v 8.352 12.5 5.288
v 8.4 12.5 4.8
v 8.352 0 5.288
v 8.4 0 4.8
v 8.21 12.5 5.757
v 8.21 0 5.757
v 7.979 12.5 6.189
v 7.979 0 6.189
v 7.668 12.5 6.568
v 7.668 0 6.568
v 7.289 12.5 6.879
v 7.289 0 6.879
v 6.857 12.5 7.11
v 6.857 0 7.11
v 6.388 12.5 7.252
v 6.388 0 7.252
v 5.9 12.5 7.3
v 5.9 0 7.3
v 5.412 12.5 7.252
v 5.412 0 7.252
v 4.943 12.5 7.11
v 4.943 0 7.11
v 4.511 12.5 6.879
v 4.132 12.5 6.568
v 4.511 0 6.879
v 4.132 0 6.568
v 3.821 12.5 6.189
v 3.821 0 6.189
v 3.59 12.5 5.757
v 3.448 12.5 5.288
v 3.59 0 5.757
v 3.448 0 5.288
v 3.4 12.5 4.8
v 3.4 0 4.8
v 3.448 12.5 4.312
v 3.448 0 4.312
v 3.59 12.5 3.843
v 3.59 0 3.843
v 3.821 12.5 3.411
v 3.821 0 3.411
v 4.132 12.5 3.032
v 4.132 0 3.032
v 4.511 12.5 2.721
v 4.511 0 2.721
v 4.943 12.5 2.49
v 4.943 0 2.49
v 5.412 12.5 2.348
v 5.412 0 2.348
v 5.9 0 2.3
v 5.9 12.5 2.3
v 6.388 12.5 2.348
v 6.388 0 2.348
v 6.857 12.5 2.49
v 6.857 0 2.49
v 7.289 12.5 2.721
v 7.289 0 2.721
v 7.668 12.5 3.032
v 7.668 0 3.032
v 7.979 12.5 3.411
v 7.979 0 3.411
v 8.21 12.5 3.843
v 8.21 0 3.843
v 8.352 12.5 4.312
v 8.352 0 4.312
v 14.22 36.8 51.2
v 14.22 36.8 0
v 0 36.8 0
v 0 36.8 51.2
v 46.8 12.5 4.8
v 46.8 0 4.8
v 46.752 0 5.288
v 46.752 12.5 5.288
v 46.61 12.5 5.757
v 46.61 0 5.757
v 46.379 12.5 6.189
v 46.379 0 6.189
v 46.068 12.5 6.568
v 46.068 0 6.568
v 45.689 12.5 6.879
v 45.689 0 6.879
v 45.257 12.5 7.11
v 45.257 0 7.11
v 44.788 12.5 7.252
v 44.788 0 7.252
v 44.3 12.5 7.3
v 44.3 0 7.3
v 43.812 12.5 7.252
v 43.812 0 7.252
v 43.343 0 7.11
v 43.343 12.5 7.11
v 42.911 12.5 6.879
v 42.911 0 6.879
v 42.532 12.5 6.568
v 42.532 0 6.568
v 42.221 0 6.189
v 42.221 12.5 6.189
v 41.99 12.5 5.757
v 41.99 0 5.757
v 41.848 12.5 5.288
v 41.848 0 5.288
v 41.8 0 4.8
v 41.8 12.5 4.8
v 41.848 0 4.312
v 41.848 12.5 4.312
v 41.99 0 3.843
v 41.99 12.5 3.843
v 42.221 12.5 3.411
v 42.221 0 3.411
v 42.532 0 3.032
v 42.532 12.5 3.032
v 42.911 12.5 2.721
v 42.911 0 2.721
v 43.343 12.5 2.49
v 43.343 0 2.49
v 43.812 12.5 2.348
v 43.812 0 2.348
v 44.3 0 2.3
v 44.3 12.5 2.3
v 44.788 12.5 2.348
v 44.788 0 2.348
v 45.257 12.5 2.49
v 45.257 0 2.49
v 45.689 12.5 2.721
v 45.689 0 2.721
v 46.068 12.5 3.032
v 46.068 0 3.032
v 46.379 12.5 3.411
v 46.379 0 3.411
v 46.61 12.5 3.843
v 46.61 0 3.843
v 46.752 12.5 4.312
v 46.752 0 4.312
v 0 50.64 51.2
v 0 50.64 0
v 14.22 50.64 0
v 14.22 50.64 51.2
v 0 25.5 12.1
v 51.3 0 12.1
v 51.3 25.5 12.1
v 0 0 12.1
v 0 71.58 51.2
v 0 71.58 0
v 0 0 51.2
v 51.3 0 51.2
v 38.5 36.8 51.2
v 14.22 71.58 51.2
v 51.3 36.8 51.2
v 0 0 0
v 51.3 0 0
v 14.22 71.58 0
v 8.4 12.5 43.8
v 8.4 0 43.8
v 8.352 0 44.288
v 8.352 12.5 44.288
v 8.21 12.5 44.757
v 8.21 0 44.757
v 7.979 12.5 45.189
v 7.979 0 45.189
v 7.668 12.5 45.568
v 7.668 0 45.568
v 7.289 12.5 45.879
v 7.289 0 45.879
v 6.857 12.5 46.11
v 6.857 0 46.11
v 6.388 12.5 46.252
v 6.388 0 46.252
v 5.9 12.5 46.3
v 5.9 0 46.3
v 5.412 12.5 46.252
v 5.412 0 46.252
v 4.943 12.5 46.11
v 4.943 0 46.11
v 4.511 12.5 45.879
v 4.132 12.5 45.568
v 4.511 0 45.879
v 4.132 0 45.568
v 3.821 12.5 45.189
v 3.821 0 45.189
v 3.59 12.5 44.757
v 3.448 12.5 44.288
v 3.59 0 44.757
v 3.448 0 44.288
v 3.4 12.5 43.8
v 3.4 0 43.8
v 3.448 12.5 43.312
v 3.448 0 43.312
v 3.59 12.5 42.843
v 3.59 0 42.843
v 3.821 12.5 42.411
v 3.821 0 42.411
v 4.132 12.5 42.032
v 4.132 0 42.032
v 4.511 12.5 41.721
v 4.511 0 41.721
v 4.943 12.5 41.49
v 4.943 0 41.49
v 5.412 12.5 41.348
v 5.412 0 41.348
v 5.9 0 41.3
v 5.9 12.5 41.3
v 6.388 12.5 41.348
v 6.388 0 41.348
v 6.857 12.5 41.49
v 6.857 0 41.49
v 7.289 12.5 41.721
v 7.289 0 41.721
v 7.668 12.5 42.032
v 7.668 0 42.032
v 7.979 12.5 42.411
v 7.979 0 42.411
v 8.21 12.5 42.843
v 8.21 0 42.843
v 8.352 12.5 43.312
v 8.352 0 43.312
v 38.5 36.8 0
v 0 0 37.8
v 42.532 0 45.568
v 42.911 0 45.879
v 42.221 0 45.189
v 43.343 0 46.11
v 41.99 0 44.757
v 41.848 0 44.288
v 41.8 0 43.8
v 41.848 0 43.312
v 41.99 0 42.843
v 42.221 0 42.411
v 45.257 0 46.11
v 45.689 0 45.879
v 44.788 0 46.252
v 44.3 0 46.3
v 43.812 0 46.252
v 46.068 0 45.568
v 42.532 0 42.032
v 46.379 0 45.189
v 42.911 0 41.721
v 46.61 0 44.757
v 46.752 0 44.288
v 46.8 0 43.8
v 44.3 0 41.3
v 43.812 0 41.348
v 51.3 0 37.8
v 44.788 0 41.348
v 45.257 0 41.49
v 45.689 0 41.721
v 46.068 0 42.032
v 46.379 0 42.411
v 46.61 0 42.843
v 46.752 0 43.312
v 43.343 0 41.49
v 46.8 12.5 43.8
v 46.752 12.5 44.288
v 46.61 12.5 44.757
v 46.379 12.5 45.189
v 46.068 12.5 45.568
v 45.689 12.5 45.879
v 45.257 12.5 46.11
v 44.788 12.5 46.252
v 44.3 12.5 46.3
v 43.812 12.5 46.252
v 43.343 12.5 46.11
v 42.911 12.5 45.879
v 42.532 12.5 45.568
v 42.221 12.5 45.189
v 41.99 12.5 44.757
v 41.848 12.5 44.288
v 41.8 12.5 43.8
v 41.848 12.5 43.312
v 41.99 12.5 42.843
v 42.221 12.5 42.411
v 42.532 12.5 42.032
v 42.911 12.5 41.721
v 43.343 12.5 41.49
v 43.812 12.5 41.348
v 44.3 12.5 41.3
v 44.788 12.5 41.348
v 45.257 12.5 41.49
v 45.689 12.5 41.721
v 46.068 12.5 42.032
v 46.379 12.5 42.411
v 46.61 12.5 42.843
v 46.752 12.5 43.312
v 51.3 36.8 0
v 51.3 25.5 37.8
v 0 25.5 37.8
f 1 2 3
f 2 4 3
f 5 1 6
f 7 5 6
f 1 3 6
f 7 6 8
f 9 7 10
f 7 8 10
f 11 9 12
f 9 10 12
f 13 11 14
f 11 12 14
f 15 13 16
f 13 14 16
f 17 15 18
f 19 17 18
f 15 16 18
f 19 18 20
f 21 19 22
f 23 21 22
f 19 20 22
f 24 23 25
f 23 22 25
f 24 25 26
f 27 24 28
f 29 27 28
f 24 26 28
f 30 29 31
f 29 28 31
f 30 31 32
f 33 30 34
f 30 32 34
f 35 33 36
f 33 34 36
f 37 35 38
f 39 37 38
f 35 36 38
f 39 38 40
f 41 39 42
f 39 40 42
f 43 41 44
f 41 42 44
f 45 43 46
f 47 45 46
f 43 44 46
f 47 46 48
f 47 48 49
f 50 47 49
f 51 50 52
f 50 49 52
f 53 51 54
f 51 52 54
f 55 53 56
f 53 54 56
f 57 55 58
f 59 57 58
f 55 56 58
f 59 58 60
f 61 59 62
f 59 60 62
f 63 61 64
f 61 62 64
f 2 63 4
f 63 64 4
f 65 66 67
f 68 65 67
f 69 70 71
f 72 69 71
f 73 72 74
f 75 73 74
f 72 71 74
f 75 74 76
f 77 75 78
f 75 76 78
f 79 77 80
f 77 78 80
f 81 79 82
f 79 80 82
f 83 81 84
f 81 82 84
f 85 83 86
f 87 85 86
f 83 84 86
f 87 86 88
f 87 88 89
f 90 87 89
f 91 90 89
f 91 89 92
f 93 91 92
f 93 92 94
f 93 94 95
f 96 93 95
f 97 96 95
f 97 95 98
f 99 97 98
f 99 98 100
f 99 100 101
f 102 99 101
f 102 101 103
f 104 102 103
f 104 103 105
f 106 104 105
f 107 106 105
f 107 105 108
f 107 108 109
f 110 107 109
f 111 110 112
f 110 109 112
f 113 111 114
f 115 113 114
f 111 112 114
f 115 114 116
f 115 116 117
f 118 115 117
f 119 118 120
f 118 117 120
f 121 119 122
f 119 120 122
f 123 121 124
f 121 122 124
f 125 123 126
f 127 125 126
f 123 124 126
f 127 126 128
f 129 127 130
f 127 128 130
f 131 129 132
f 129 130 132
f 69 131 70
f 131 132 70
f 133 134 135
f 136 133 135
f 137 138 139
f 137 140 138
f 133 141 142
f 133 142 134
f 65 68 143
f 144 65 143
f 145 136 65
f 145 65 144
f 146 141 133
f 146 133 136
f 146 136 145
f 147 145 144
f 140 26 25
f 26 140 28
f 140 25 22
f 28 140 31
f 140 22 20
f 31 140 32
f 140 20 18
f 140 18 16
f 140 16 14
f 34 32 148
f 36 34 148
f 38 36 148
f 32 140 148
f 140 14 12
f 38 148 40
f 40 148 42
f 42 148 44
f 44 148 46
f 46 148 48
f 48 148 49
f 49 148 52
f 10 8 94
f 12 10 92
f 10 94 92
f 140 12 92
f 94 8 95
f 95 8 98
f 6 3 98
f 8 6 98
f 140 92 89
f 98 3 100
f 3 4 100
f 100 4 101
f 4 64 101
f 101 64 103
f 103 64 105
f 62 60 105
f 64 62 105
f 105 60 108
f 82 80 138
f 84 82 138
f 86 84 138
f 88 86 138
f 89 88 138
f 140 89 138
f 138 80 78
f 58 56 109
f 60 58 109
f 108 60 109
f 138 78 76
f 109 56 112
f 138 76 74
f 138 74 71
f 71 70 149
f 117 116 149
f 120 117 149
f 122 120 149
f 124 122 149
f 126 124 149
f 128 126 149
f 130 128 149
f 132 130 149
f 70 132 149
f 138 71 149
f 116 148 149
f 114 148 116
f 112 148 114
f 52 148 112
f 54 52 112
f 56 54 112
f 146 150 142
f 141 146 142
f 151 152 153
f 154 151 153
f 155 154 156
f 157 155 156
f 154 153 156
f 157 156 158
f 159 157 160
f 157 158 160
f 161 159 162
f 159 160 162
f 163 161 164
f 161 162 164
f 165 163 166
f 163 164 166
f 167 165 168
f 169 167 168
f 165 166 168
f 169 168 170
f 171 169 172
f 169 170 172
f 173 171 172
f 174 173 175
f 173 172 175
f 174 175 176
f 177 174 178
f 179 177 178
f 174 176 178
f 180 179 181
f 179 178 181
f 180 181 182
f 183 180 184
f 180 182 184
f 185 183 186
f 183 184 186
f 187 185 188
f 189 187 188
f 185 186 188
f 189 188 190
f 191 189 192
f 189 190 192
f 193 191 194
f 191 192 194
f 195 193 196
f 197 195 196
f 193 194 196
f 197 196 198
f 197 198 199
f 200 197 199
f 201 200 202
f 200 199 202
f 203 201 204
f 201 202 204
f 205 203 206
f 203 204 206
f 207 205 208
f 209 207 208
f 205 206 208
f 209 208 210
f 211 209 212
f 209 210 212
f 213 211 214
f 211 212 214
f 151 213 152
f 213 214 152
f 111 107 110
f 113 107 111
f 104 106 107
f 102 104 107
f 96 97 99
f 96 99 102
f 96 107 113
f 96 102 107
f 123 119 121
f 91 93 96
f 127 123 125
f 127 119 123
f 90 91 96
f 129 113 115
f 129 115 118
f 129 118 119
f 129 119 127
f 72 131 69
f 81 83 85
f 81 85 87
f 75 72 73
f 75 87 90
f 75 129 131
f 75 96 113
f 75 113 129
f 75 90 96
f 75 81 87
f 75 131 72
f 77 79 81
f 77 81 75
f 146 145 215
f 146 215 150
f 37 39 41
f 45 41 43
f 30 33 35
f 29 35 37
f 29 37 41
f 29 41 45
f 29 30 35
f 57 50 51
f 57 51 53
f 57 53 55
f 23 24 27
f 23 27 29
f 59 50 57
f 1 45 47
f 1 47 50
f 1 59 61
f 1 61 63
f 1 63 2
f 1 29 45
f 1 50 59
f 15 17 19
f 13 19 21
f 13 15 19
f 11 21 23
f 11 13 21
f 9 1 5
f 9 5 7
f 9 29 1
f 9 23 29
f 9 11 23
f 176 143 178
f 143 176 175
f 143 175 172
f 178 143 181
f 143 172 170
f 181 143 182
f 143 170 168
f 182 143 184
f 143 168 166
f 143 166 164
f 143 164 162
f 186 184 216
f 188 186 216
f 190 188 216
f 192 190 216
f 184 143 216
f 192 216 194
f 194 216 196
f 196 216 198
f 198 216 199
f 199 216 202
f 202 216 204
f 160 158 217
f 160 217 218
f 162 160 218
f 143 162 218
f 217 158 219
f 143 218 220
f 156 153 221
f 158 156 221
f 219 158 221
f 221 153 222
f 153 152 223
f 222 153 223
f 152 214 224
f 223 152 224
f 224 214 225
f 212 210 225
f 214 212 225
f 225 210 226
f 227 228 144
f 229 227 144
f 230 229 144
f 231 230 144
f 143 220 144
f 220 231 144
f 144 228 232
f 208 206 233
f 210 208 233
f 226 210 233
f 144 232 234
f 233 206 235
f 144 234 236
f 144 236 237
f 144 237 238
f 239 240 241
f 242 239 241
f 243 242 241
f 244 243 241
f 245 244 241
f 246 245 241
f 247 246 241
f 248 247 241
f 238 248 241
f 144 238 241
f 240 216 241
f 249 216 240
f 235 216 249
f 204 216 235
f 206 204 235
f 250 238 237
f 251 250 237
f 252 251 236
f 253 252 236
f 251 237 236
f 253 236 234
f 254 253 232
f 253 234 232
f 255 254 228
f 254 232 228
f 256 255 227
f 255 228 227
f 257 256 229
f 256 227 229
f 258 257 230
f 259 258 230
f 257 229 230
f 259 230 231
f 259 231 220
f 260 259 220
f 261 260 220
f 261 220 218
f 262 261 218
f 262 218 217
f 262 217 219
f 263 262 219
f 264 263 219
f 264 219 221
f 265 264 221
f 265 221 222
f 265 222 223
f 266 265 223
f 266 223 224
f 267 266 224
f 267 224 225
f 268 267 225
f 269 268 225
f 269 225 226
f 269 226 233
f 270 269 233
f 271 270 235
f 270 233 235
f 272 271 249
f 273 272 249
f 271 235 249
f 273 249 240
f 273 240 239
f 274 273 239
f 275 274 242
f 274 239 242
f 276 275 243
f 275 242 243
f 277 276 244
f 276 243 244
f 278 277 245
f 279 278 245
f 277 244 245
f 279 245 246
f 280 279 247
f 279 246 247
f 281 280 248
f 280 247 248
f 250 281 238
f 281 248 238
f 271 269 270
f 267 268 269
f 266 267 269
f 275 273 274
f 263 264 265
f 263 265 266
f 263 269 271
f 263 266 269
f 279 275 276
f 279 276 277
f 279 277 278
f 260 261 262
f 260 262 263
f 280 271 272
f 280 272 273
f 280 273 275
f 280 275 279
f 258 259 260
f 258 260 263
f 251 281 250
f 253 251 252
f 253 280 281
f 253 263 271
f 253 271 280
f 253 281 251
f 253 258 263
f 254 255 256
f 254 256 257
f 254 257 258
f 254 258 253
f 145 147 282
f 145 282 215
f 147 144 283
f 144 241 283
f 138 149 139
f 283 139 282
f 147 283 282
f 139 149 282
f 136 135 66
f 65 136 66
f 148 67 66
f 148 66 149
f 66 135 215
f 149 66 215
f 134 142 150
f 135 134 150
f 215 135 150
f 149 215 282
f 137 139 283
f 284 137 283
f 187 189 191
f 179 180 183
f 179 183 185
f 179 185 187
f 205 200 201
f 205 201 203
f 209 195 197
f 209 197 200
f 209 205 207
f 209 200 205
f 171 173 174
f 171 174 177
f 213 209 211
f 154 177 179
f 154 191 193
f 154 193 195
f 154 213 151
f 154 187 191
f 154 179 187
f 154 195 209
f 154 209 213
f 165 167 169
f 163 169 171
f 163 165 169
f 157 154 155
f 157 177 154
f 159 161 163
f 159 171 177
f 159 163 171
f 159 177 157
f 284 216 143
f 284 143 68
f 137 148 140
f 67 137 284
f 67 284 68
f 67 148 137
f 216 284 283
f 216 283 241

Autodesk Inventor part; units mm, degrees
ref_plane "YZ Plane" through (0, 0, 0) normal (1, 0, 0) x (0, 1, 0)
ref_plane "XZ Plane" through (0, 0, 0) normal (0, 1, 0) x (-1, 0, 0)
ref_plane "XY Plane" through (0, 0, 0) normal (0, 0, 1) x (1, 0, 0)
sketch "草圖1" plane through (0, 0, 0) normal (0, 0, 1) x (1, 0, 0)
  line L0 (0, 0) -> (51.3, 0)
  line L1 (51.3, 0) -> (51.3, 36.8)
  line L2 (51.3, 36.8) -> (38.5, 36.8)
  line L3 (38.5, 36.8) -> (14.22, 71.58)
  line L4 (14.22, 71.58) -> (0, 71.58)
  line L5 (0, 71.58) -> (0, 50.64)
  line L6 (0, 50.64) -> (14.22, 50.64)
  line L7 (14.22, 50.64) -> (14.22, 36.8)
  line L8 (14.22, 36.8) -> (0, 36.8)
  line L9 (0, 0) -> (0, 36.8)
  dimension "d0" = 36.8
  dimension "d1" = 14.22
  dimension "d3" = 13.84
  dimension "d4" = 14.22
  dimension "d5" = 71.58
  dimension "d6" = 51.3
  dimension "d7" = 12.8
extrude "擠出1" add sketch "草圖1" along normal blind 51.2
sketch "草圖2" plane through (0, 0, 0) normal (-1, 0, 0) x (0, 0, 1)
  line L0 (0, 0) -> (51.2, 0) projected
  line L1 (12.1, 0) -> (12.1, 25.5)
  line L2 (12.1, 25.5) -> (37.8, 25.5)
  line L3 (37.8, 25.5) -> (37.8, -6.925)
  line L4 (37.8, -6.925) -> (13.9148, -5.9857)
  line L5 (13.9148, -5.9857) -> (12.1, 0)
  line L6 (51.2, 36.8) -> (51.2, 0) projected
  dimension "d10" = 25.7
  dimension "d12" = 13.4
  dimension "d13" = 25.5
extrude "擠出2" cut sketch "草圖2" against normal up to next
sketch "草圖3" plane through (0, 0, 51.2) normal (0, -1, 0) x (1, 0, 0)
  circle A0 centre (44.3, -7.4) radius 2.5
  line L0 (0, -13.4) -> (51.3, -13.4) projected
  line L1 (51.3, -13.4) -> (51.3, 0) projected
  circle A1 centre (5.9, -7.4) radius 2.5
  point P0 (0, -51.2)
  dimension "d16" = 5
  dimension "d18" = 6
  dimension "d19" = 7
  dimension "d22" = 38.4
extrude "擠出3" cut sketch "草圖3" against normal blind 12.5
pattern_linear "矩形陣列1" count 2 spacing 39 along (0, 0, -1) of "擠出3"
properties part number "小虎鉗-左側" material "鋁合金 6061"
